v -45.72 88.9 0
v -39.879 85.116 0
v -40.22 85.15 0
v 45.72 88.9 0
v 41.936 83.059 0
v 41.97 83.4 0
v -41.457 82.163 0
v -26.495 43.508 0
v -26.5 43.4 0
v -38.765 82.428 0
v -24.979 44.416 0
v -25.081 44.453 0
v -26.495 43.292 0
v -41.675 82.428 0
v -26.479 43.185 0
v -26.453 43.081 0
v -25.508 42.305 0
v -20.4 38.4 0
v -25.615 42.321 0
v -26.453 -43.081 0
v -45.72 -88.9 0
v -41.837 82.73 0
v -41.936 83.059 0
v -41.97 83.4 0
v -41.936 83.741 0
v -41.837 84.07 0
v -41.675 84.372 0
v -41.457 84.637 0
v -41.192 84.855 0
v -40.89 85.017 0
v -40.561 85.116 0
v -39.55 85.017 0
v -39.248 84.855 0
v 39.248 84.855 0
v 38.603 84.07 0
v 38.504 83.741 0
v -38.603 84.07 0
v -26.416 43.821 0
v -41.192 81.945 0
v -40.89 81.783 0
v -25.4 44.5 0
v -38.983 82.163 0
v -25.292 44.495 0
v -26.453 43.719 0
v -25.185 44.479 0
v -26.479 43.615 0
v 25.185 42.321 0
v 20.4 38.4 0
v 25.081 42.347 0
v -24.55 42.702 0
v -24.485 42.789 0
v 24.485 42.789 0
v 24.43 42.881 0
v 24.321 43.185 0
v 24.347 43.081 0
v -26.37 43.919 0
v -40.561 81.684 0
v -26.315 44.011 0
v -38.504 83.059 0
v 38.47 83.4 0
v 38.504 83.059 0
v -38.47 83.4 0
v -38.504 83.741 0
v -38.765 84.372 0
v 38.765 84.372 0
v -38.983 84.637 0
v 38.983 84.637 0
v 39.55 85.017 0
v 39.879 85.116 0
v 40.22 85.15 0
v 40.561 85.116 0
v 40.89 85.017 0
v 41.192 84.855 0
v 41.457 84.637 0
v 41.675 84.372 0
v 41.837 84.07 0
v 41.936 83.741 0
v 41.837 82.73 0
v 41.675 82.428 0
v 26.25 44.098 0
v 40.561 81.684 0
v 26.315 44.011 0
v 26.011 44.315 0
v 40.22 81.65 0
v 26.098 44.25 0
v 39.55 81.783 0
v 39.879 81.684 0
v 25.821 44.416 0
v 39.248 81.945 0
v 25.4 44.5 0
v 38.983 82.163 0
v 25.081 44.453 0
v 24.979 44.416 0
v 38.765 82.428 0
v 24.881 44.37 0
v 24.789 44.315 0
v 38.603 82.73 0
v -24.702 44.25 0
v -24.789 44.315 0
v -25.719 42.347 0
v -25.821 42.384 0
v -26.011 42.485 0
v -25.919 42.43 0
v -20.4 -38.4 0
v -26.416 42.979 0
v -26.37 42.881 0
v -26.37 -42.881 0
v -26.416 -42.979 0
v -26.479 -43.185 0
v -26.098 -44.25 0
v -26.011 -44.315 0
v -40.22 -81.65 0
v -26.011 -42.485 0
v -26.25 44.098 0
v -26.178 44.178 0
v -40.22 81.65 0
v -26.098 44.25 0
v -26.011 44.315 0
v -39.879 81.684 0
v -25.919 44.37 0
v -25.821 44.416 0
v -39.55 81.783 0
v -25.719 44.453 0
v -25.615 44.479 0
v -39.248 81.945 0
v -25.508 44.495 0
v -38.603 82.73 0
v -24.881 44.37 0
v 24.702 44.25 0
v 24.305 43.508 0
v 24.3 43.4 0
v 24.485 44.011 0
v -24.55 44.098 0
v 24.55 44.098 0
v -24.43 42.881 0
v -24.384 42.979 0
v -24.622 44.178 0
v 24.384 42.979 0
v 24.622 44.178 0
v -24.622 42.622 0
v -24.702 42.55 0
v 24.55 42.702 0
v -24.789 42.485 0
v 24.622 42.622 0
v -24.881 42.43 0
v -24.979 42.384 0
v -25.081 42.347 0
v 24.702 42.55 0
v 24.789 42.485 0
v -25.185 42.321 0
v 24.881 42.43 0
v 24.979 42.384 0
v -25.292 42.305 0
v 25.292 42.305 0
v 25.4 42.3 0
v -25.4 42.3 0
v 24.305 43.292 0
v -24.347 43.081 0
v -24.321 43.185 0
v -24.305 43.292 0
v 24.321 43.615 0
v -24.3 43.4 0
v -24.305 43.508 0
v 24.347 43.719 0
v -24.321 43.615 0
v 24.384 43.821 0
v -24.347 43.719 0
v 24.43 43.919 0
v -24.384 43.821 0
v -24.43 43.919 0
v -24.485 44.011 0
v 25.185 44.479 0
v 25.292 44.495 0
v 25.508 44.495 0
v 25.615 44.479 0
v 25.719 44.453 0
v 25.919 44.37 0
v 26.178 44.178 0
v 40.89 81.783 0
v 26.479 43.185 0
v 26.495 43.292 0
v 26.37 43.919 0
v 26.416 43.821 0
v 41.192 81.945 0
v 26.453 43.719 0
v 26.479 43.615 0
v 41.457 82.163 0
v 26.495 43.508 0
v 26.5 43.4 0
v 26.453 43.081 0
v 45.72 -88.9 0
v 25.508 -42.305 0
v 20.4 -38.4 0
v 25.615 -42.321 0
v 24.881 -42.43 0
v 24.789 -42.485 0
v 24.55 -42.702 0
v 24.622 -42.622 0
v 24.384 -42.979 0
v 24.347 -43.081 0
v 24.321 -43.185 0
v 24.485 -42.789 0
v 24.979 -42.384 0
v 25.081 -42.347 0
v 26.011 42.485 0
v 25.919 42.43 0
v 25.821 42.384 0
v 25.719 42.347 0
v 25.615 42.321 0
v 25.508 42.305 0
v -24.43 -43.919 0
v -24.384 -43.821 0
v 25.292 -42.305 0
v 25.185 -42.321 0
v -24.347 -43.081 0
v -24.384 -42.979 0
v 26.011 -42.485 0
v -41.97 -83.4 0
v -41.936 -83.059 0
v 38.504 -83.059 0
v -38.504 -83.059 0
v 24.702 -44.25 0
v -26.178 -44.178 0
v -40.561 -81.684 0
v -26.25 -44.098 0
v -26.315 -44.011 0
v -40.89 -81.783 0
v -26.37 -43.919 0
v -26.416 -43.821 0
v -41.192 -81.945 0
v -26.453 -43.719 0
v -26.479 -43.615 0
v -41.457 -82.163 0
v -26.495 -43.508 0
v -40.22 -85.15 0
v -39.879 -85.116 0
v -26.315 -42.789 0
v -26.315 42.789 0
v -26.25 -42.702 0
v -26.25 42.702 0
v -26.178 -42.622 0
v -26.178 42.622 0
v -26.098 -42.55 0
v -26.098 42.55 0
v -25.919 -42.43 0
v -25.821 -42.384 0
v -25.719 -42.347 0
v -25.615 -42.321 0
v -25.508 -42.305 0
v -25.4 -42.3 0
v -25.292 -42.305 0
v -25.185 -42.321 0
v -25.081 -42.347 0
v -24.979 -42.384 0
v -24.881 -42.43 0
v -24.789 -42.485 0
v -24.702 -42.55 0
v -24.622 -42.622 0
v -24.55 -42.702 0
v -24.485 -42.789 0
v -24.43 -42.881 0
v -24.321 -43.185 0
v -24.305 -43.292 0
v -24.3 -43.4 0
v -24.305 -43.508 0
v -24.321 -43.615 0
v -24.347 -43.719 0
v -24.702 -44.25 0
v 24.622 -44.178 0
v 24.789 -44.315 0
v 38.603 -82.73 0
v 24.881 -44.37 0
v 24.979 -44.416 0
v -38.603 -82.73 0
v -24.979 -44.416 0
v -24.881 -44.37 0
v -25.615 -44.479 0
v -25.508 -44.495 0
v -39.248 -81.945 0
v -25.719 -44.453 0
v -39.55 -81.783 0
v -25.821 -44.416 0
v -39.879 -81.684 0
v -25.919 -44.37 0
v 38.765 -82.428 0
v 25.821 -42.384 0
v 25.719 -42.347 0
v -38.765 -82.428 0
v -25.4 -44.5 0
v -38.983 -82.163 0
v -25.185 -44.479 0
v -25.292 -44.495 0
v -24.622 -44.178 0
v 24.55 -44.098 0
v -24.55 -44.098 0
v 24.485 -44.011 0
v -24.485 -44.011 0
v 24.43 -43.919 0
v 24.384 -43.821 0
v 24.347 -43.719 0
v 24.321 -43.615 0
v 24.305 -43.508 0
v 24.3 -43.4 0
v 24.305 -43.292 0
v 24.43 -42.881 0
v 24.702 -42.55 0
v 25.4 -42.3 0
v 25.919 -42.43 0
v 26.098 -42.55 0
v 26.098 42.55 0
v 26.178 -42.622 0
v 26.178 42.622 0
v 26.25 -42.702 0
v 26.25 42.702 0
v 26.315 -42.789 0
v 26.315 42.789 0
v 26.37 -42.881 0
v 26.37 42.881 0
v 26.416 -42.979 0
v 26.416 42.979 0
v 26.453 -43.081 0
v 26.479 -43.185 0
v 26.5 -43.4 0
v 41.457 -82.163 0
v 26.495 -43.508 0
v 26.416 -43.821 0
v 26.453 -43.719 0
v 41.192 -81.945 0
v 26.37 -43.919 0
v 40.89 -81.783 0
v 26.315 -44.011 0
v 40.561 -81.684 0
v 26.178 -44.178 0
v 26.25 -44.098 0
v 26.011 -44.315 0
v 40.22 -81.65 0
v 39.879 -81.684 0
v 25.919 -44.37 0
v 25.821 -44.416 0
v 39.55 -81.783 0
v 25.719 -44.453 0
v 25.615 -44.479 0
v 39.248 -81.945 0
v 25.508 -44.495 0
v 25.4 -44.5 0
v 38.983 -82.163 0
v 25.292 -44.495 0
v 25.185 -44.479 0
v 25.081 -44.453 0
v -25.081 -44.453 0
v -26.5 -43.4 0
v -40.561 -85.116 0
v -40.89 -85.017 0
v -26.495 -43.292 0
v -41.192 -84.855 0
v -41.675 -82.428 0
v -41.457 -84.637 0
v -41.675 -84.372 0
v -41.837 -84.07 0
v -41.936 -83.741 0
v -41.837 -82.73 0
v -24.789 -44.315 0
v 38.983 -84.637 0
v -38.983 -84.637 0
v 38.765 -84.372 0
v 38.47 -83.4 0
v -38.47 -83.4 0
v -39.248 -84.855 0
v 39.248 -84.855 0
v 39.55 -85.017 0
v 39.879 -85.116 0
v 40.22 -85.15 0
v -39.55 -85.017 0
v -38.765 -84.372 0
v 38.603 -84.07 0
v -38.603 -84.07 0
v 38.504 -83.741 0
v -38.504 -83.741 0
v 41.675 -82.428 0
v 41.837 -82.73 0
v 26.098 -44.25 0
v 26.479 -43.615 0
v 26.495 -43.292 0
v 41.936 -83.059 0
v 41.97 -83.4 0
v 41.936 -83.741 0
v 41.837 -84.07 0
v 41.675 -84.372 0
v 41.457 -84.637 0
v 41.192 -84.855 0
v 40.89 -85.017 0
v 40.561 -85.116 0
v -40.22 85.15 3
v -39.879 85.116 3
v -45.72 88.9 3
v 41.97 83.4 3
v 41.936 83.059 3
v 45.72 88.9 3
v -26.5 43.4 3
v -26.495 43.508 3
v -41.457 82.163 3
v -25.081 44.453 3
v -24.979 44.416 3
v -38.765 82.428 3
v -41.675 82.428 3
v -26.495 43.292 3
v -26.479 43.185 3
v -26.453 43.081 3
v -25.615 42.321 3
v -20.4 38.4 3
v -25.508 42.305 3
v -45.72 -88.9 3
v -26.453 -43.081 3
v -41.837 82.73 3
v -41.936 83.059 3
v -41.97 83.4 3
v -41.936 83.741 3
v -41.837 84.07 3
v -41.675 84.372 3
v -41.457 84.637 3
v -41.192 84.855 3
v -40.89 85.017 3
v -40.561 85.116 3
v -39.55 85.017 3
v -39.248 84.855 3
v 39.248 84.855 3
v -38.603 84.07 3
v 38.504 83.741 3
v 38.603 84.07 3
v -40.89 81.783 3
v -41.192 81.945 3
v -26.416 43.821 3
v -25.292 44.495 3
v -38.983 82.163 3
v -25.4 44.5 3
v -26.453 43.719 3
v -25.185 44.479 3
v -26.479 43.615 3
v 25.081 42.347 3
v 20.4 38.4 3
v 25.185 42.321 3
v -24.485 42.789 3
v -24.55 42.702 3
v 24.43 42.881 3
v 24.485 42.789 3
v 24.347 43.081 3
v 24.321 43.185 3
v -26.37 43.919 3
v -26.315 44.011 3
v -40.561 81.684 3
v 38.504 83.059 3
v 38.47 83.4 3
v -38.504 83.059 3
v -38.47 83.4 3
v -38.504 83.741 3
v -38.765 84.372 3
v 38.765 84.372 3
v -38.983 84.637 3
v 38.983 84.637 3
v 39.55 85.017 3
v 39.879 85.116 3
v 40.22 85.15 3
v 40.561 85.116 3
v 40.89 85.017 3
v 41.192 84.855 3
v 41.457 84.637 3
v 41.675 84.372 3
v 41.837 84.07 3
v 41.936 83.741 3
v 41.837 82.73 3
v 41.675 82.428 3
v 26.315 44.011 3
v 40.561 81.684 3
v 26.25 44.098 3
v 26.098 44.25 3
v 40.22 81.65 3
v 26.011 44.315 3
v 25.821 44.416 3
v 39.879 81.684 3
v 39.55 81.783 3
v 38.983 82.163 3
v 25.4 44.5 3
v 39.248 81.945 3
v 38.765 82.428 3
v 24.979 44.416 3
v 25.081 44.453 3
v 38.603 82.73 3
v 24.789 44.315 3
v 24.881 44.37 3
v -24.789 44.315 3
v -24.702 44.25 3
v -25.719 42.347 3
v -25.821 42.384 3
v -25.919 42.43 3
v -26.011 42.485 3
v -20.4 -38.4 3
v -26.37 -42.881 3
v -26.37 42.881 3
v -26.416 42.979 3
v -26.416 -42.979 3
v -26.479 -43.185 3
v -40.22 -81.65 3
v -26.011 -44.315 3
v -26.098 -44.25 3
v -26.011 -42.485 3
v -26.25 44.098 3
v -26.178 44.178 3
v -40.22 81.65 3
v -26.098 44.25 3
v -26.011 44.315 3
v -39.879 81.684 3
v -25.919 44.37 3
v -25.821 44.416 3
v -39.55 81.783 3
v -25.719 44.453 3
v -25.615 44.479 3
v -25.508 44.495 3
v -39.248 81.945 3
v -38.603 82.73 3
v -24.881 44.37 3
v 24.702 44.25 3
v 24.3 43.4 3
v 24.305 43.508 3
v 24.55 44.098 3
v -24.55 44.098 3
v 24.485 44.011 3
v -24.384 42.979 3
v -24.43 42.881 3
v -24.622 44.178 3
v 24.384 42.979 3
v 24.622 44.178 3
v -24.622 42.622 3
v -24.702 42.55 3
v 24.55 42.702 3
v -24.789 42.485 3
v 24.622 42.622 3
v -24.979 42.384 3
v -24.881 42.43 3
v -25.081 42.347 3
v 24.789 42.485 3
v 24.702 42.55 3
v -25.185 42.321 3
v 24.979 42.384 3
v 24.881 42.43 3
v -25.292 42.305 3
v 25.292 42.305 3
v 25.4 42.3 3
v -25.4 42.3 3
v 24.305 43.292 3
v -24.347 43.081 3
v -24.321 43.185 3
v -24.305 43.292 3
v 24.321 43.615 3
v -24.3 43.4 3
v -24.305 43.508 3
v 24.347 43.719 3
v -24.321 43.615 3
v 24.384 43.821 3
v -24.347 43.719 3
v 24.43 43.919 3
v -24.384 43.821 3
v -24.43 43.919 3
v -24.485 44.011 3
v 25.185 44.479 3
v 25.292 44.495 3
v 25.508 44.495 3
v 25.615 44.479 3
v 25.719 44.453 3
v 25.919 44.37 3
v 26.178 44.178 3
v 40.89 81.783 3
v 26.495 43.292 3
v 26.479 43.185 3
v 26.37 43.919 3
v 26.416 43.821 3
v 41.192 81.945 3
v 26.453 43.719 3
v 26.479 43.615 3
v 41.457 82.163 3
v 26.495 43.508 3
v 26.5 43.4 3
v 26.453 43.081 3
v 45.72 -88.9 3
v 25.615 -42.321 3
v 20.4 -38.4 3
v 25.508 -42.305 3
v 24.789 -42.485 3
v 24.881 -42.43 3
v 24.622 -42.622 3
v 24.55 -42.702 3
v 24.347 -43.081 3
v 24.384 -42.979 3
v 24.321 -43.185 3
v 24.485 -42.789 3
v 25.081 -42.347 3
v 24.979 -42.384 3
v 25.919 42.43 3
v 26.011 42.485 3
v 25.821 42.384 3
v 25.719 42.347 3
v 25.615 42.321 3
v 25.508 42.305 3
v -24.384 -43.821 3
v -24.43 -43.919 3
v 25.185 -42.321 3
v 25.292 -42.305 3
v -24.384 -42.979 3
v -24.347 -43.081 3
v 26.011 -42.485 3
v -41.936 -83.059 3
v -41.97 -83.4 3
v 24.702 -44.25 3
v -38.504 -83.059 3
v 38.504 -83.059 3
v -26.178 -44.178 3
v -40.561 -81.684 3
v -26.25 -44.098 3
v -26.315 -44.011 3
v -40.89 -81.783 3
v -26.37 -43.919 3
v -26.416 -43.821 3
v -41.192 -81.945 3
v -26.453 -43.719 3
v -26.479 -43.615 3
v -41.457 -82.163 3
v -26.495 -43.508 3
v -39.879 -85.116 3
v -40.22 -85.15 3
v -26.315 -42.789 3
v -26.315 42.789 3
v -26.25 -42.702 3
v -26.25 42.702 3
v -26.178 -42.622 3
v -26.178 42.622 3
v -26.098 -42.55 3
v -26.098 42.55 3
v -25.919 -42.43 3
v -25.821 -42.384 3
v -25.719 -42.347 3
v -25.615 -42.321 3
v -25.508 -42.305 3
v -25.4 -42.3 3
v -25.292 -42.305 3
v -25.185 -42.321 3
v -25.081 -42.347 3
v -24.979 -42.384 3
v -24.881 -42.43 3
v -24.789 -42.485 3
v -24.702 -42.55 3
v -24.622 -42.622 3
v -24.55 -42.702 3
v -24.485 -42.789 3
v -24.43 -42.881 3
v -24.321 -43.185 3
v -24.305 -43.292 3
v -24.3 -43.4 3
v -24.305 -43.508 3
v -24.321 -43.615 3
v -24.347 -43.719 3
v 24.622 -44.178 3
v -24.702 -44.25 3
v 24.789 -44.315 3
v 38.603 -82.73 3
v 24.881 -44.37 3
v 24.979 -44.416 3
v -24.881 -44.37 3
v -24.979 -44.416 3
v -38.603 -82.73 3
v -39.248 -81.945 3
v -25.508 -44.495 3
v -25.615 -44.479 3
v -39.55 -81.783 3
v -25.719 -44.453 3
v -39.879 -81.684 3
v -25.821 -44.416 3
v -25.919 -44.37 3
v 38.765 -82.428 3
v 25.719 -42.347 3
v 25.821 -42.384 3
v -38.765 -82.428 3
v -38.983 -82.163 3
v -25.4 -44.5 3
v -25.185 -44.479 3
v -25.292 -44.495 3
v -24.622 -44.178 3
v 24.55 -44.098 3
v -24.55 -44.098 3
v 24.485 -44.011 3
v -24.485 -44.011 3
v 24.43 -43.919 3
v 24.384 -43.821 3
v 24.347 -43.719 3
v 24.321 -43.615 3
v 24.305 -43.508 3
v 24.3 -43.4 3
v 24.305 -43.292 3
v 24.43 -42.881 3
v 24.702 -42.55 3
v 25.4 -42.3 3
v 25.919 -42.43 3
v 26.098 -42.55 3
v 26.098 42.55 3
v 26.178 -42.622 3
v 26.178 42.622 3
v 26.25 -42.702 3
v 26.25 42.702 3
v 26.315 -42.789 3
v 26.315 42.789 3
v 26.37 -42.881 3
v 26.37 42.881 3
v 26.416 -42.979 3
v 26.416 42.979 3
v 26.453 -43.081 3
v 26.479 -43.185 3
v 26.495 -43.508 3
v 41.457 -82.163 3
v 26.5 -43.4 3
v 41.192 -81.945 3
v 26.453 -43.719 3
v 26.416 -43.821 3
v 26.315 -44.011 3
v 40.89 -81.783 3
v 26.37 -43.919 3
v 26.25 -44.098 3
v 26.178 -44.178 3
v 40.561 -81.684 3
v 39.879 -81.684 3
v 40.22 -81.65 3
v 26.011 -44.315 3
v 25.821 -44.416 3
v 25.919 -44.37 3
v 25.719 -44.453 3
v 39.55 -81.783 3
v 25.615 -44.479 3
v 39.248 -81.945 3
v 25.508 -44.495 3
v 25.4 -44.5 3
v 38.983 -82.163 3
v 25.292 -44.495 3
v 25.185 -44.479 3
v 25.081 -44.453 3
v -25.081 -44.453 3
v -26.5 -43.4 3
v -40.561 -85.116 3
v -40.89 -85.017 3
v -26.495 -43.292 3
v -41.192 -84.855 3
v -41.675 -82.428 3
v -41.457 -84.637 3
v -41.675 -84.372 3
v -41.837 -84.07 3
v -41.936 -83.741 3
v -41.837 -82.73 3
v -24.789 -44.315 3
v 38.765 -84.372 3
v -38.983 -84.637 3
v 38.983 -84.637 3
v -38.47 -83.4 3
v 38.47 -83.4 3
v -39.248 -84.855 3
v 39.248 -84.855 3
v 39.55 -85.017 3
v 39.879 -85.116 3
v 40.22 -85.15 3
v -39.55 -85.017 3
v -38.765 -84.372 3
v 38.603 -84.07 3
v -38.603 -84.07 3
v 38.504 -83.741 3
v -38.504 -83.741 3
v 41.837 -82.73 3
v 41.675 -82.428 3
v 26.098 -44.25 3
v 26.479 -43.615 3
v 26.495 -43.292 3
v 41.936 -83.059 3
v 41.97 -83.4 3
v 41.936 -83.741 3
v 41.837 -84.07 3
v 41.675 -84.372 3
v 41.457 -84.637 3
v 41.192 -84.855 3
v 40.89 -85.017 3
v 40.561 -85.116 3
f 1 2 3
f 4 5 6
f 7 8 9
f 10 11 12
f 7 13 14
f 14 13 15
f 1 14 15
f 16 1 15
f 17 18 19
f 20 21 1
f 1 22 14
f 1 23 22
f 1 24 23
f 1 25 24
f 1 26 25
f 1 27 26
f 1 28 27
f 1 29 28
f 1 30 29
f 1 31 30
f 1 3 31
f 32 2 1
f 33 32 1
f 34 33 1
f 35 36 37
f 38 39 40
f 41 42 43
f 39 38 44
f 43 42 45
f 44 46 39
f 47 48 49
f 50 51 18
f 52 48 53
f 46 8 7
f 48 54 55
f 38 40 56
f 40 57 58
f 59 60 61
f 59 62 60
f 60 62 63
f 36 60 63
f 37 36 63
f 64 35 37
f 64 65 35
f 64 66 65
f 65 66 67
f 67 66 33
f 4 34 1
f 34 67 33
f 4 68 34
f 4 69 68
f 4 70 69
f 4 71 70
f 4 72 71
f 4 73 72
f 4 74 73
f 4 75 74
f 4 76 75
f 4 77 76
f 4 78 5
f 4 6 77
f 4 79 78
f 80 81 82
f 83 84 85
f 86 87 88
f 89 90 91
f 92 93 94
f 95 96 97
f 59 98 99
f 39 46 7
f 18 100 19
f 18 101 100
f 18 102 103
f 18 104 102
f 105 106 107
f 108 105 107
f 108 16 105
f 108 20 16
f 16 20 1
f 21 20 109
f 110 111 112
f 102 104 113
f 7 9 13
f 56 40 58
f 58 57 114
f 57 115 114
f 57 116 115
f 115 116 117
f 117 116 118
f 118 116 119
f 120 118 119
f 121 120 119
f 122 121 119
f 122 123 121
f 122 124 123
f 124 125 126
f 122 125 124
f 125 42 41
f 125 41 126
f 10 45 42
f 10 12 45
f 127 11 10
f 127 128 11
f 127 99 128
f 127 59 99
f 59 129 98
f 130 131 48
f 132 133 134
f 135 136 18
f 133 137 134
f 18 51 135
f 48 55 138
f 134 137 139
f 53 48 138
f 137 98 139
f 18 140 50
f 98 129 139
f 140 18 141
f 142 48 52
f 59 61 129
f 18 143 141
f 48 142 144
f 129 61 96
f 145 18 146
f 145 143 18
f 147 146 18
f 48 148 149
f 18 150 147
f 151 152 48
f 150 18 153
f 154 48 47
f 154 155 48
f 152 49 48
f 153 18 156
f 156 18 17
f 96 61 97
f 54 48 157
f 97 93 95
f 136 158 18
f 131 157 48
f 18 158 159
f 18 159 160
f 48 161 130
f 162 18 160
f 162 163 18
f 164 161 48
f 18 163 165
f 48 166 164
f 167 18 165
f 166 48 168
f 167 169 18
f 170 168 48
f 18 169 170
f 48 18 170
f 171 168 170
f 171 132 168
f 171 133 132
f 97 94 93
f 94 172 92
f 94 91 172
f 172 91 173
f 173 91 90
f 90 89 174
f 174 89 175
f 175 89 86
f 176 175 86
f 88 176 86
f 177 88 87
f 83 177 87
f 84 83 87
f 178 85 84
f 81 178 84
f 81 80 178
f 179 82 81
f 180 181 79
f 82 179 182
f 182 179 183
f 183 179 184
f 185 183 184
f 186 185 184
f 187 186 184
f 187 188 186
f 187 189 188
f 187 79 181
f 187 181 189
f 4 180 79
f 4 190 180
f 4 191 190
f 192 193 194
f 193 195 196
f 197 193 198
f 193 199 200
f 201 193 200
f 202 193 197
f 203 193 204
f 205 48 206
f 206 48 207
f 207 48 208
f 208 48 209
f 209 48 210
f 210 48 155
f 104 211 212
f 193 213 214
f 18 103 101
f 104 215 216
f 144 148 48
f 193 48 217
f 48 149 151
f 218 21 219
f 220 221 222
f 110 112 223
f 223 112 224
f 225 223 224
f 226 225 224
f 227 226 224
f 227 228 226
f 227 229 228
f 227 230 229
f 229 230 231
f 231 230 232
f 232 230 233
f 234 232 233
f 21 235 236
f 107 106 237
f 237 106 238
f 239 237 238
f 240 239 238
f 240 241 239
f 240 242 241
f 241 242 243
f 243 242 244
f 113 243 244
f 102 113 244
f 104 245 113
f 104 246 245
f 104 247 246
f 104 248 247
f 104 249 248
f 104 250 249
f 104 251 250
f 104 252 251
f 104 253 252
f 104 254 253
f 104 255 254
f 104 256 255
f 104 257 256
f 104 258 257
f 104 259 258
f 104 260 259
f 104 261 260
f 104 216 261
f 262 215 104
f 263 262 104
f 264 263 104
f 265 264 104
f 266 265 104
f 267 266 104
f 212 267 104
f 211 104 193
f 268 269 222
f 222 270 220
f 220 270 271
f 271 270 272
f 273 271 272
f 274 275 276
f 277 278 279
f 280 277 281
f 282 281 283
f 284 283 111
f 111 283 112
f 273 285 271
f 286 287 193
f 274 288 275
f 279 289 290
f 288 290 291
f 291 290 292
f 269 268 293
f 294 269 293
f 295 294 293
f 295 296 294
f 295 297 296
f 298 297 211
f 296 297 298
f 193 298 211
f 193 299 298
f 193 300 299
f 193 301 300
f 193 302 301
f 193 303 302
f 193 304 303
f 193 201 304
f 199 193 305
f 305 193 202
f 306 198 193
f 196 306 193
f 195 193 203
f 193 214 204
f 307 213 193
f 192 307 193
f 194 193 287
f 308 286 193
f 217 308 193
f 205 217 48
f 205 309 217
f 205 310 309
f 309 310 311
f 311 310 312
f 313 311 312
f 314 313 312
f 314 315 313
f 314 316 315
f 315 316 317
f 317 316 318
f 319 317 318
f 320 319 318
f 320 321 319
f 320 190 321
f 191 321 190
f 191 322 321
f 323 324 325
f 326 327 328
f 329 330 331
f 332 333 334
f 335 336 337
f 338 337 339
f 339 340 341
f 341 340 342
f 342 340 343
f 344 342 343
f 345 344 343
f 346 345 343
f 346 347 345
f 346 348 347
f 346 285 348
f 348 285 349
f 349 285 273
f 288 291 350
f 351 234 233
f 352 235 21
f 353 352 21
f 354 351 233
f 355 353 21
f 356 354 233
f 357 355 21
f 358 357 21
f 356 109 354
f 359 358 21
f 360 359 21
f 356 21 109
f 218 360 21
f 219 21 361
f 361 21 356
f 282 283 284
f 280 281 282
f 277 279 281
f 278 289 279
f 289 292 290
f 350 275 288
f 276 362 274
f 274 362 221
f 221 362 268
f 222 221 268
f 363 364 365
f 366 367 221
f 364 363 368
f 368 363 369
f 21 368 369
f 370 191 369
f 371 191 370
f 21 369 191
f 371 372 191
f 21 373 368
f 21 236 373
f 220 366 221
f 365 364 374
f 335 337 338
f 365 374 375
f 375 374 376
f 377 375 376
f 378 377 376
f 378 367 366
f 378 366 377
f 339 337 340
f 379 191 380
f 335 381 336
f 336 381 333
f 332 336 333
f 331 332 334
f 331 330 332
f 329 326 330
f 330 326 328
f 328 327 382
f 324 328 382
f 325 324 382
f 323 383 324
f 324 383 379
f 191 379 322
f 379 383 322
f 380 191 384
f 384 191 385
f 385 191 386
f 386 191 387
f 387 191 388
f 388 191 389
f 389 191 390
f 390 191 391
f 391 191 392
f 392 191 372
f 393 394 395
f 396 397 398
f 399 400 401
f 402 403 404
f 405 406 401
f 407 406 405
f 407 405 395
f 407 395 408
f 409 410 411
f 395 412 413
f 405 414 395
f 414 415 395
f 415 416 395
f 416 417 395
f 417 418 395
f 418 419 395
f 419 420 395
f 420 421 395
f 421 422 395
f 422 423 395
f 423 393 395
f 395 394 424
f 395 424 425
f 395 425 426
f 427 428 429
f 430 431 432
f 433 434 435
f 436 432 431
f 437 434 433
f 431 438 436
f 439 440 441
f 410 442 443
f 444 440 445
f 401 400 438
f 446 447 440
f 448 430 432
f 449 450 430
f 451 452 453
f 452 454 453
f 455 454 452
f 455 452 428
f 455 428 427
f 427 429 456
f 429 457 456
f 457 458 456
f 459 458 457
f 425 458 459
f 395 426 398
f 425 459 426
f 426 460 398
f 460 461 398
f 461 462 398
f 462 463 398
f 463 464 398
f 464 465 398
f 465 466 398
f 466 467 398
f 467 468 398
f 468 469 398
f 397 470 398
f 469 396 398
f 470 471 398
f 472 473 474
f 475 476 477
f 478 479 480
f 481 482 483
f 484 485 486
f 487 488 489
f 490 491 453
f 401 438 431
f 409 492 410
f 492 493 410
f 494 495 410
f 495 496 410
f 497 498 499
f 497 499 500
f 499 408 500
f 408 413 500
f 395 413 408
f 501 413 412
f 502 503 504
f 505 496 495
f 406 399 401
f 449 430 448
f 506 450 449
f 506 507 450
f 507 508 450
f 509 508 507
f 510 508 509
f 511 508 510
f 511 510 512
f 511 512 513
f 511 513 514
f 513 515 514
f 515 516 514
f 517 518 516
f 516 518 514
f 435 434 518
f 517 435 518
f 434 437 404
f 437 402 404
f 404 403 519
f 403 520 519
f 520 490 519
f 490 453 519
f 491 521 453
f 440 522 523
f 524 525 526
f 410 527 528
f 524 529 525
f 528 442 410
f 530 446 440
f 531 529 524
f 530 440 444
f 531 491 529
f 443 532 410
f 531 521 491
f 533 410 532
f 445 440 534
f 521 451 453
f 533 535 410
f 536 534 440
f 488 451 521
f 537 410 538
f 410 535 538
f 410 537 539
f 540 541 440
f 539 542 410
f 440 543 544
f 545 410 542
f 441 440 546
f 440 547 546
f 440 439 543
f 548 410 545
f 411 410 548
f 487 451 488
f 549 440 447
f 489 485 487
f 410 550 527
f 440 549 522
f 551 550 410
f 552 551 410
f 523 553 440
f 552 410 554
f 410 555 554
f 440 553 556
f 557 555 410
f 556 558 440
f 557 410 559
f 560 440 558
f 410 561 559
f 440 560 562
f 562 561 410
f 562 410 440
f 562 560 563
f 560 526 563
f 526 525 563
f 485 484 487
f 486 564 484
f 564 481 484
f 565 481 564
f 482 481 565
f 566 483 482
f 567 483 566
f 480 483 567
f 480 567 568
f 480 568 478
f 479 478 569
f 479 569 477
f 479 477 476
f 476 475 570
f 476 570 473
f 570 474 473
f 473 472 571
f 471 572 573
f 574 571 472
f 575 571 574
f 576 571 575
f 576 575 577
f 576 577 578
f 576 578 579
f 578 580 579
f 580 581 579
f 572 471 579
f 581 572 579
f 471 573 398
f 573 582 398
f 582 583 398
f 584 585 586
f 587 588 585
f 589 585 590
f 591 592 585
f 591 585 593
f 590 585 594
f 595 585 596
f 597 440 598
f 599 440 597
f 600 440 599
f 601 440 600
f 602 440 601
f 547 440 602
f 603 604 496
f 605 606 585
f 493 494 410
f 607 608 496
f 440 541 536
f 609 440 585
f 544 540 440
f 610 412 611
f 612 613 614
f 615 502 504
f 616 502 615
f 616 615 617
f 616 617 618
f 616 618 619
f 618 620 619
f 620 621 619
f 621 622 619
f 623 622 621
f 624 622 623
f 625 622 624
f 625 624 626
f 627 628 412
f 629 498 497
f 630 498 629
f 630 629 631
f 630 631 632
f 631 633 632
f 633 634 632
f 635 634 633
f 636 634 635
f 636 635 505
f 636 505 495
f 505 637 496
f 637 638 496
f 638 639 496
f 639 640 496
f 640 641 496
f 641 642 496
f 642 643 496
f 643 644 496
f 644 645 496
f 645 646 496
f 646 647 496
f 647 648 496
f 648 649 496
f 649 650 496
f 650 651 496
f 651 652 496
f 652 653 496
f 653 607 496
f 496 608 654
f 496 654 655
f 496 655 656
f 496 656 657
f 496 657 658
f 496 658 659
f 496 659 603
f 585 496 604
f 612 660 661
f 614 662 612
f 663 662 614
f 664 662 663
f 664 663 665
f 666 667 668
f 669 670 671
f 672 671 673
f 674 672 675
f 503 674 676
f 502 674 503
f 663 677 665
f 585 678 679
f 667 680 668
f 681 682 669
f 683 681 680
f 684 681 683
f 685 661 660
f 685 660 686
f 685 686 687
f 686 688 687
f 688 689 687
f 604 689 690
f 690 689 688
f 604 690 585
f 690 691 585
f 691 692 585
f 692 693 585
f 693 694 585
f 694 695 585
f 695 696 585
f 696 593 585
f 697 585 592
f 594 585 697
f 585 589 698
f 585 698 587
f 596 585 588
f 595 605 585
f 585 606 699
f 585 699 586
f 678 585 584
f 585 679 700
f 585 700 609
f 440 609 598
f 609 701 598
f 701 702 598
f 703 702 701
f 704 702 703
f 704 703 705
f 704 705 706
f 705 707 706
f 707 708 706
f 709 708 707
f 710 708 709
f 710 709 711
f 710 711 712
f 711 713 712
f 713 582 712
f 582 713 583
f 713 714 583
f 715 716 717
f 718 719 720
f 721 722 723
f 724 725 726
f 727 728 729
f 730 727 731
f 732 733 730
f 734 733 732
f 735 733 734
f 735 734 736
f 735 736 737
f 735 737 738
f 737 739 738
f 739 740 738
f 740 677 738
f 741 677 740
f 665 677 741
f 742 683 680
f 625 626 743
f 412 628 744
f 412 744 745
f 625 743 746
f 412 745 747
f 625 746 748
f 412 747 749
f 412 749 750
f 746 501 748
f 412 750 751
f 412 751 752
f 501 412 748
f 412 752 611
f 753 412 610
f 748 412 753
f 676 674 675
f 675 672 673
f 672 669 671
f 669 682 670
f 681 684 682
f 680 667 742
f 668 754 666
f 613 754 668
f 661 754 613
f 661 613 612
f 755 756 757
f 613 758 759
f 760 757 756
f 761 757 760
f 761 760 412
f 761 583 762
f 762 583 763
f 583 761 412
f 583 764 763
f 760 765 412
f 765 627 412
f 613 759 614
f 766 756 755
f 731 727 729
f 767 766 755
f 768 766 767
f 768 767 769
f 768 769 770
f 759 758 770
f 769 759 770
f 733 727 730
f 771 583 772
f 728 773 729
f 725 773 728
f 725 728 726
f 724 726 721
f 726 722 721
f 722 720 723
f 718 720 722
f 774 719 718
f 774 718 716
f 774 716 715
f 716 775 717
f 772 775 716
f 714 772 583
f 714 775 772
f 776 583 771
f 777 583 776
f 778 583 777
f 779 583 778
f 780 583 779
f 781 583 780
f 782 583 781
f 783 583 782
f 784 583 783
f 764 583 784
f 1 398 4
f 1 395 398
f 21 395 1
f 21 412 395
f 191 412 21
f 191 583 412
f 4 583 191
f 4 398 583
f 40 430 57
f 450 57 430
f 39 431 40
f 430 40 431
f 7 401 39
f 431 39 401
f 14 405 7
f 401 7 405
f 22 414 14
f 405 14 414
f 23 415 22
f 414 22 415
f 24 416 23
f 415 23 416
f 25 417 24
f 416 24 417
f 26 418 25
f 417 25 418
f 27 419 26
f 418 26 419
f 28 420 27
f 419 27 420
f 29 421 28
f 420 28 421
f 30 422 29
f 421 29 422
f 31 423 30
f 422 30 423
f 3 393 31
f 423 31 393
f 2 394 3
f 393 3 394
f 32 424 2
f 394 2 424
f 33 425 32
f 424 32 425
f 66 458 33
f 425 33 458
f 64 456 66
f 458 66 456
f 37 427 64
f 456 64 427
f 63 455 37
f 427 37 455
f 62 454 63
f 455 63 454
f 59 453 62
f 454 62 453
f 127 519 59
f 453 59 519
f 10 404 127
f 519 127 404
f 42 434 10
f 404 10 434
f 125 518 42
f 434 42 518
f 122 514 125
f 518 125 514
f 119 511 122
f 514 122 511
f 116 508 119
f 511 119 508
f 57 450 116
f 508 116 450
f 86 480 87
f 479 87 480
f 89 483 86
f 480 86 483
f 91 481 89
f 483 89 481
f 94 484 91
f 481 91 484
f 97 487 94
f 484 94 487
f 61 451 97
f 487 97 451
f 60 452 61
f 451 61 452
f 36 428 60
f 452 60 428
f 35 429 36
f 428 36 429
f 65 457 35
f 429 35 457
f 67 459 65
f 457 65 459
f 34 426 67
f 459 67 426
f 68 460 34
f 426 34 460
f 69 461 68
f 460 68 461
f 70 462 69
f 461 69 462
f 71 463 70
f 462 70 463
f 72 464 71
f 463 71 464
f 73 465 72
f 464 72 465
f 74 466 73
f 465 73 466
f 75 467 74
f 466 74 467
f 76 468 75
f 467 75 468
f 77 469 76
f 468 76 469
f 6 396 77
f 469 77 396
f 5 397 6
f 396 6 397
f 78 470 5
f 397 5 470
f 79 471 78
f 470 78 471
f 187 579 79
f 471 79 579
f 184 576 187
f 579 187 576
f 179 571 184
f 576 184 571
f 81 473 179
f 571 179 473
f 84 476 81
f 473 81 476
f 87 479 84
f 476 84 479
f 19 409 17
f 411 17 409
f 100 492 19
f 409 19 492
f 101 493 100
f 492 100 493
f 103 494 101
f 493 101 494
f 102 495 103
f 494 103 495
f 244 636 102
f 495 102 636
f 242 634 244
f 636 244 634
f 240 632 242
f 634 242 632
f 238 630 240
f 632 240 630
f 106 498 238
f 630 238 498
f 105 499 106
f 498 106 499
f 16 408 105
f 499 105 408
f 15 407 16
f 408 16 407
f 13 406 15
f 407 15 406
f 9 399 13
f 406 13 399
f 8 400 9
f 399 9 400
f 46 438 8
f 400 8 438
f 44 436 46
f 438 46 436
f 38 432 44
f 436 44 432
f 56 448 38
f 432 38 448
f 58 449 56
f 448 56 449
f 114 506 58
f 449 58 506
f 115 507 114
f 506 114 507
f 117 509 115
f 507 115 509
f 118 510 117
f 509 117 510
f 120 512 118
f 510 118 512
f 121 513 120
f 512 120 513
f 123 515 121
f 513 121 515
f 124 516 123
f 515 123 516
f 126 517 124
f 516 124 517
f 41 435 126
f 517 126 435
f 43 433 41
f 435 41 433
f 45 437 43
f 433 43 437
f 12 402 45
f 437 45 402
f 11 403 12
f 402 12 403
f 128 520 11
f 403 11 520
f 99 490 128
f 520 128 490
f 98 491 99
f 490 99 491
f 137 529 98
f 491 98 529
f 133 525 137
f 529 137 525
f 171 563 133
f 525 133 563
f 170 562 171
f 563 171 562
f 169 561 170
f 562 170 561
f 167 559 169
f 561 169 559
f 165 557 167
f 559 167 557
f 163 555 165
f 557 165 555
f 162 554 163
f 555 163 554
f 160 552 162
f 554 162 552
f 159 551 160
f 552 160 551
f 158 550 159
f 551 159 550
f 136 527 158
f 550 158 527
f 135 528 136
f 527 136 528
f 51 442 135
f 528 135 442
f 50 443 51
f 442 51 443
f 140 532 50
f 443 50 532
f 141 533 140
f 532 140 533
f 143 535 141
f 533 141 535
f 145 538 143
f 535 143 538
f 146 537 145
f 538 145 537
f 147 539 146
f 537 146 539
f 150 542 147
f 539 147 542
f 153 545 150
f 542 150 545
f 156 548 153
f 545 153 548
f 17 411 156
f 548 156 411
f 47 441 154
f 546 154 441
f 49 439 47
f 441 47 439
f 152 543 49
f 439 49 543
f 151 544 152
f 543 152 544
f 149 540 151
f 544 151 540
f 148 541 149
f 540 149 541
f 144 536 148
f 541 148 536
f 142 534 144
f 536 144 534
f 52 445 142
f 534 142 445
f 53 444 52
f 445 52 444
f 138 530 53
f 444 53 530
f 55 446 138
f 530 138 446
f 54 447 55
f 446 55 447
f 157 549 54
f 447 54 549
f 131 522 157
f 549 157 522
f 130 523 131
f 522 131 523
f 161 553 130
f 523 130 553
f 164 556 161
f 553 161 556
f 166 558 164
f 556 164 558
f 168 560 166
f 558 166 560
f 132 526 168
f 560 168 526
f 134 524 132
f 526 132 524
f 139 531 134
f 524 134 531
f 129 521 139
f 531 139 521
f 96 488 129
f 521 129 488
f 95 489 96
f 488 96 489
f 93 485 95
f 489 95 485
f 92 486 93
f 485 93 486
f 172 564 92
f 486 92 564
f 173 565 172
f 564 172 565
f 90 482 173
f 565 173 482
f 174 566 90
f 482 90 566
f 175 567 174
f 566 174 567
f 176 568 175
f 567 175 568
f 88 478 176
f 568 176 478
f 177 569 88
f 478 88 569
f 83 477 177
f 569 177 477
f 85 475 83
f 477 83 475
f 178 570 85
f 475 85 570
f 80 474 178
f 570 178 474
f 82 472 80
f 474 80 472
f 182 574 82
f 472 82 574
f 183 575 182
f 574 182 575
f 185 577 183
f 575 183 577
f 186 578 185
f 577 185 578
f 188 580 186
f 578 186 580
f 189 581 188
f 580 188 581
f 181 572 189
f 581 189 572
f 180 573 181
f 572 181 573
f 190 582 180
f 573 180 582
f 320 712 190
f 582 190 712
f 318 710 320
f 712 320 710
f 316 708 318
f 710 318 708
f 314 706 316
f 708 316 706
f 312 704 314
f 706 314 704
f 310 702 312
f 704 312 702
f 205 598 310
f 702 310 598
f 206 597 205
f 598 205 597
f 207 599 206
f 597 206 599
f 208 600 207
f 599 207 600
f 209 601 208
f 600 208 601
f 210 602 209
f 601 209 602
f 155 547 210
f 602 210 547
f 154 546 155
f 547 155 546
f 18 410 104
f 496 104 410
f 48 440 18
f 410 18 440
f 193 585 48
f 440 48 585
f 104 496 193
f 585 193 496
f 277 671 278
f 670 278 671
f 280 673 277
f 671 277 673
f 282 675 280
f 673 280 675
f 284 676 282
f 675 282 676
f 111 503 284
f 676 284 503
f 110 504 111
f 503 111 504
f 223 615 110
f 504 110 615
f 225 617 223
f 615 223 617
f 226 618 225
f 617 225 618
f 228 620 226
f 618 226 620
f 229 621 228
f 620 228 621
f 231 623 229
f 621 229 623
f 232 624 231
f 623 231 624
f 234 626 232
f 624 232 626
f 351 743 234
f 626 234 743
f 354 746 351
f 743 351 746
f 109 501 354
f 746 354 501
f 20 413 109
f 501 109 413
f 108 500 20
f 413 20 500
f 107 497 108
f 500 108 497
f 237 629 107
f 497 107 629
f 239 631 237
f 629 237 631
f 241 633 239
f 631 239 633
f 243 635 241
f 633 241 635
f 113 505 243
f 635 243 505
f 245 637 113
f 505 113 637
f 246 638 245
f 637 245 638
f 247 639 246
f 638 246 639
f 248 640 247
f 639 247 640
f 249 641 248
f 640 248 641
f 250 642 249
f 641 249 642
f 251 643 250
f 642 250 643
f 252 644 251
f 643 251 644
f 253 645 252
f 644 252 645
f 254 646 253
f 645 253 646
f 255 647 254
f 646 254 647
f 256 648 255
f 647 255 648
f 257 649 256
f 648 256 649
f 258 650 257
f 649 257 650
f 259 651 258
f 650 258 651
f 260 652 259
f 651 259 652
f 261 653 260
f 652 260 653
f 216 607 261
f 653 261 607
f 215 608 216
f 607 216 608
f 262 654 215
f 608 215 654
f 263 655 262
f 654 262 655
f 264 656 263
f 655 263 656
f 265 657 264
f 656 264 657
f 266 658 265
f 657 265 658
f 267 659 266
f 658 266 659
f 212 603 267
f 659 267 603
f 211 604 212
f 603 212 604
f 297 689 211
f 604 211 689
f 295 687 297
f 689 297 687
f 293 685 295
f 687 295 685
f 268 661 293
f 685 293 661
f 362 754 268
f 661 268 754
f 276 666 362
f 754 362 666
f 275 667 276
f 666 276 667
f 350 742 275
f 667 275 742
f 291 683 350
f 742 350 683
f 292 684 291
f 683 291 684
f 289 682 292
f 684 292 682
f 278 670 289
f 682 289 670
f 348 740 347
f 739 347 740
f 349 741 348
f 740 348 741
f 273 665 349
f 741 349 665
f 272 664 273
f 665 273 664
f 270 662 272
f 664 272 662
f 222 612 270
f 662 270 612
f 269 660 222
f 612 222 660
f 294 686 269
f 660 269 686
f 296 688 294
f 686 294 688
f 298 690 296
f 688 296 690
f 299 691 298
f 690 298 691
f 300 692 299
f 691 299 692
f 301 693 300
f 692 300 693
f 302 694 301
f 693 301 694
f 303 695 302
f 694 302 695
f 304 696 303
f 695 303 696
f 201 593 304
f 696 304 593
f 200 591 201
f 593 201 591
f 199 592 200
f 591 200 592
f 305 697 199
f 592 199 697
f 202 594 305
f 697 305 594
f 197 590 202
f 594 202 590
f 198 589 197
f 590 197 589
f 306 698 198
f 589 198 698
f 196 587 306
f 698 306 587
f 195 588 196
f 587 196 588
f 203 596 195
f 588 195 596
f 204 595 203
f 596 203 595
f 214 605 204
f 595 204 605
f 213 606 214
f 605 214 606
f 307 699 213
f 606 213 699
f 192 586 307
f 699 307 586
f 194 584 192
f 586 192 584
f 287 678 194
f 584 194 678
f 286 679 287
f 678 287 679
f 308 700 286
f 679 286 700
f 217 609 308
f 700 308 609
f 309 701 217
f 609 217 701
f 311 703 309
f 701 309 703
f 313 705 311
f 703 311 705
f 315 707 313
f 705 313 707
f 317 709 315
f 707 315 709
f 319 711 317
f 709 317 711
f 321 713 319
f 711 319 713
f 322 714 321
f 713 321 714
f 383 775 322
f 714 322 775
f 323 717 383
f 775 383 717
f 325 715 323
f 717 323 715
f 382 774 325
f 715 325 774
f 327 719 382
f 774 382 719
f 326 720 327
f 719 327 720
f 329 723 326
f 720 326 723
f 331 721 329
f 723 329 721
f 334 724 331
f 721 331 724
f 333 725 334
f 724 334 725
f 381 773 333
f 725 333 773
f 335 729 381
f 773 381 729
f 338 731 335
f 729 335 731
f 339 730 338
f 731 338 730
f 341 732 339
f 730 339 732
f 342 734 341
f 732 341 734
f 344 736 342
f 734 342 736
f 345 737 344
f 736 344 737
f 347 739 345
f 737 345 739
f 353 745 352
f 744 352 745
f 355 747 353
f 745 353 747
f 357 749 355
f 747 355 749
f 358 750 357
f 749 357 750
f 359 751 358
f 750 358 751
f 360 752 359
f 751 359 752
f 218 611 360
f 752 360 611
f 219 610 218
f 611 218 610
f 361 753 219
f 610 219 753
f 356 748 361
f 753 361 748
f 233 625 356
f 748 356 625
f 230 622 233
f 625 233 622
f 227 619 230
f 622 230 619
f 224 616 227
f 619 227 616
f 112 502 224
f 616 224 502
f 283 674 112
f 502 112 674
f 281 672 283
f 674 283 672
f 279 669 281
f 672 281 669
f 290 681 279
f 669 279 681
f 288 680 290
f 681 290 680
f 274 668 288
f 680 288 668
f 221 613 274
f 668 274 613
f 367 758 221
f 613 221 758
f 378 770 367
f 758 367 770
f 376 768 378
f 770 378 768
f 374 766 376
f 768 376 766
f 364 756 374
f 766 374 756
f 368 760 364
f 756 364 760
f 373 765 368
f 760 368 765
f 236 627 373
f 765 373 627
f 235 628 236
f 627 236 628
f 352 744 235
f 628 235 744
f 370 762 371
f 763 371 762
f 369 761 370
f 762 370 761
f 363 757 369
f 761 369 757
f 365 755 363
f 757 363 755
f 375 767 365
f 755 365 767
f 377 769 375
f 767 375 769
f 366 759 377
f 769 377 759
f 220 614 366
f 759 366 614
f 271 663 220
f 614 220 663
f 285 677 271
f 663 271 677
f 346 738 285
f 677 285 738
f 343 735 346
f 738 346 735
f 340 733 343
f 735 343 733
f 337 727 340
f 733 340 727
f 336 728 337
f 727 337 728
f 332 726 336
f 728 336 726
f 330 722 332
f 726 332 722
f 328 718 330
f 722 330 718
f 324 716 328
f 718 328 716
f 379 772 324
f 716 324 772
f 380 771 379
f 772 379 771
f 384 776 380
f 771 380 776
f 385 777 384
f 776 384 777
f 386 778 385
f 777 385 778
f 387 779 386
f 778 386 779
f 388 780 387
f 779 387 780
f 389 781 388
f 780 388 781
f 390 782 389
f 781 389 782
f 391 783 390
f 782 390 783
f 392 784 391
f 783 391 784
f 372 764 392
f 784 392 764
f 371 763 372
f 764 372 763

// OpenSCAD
// file: ../../makerpanel/common.scad
// =============================================================================
// MakerPanel System OpenSCAD Models
// Copyright (c) 2025 Ranch Hand Robotics, LLC. All rights reserved.
// Licensed under MIT License: https://opensource.org/licenses/MIT
// Modular maker panel system with T-slot rail mounting support
// All dimensions in millimeters
// =============================================================================

// ============================================
// Constants
// ============================================

// Panel Units
INCH = 25.4;         // Millimeters per inch
HP = 5.08;           // Horizontal Pitch = 5.08mm (0.200")
U = 44.45;           // Vertical Unit outer span = 44.45mm (1.75")

// T-Slot Specifications
// Standard T-slot twist nuts (M5/M6 compatible, drop-in style)
T_SLOT_HEIGHT = 6.9;           // T-slot nut width (M5/M6)
T_SLOT_WIDTH = 5.75 * HP;      // 5.75 HP (29.06mm) avoids even 4-HP grid alignment
T_SLOT_CORNER_RADIUS = 1.0;

// Rack Specifications
RACK_SUPPORT_WIDTH = 3; 
RACK_HOLE_DIAMETER = 3.5;   // M3 mounting holes
RACK_RAIL_HEIGHT = 11; 
RACK_RAIL_THICKNESS = 3;    // Rail material thickness
RACK_MOUNT_SLOT_LEN = 8;
CENTER_CUTOUT_SIDE_MARGIN = 2.5;
CENTER_CUTOUT_SLOT_MARGIN = 2;

// Rack Widths
RACK_19_WIDTH = 19 * INCH;  // 19 inches = 482.6 mm
RACK_10_WIDTH = 10 * INCH;  // 10 inches = 254 mm

// Panel Specifications
PANEL_THICKNESS = 3;        // Aluminum panel thickness
PANEL_DEPTH_MAX = 60;       // Maximum panel depth from front
MOUNT_HOLE_DIAMETER = 3.5;  // M3 mounting hole (for T-nuts)


// ============================================
// Utility Functions
// ============================================

// Convert HP to millimeters
function hp_to_mm(hp) = hp * HP;

// Convert U to millimeters
function u_to_mm(u) = u * U;

// Convert U to clear opening between adjacent T-slots.
// For 1U this is: U - (2 * T_SLOT_HEIGHT).
function u_clear_to_mm(u) = u * U - 2 * T_SLOT_HEIGHT;
// file: ../../makerpanel/panel.scad
// Makerpanel System OpenSCAD Models
// Copyright (c) 2025 Ranch Hand Robotics, LLC. All rights reserved.
// Licensed under MIT License: https://opensource.org/licenses/MIT
// Modular maker panel system with rack mounting support
// All dimensions in millimeters
include <common.scad>

// ============================================
// Module: Panel with T-Slot Mounting Holes
// ============================================

module makerpanel_2d(width_hp, height_u, mount_hole_diameter=MOUNT_HOLE_DIAMETER) {
    /*
        Creates a 2D maker panel profile with T-slot mounting holes (M5/M6 compatible)
    Parameters:
      - width_hp: width in HP units
      - height_u: height in U units
            - mount_hole_diameter: mounting hole diameter in mm (default from common.scad)
    */
    
    width_mm = hp_to_mm(width_hp);
    height_mm = u_to_mm(height_u);
    half_w = width_mm / 2;
    half_h = height_mm / 2;
    
    // Calculate mounting hole positions
    // For panels <1U: one centered hole per side (left/right)
    // For panels >=1U: four corner holes
    hole_inset_x = RACK_RAIL_HEIGHT / 2;
    hole_inset_y = RACK_RAIL_HEIGHT / 2;
    
    difference() {
        // Base panel
        square([width_mm, height_mm], center=true);
        
        if (height_u < 1) {
            // Sub-1U: one centered mounting hole on each side
            translate([-(half_w - hole_inset_x), 0])
                circle(r=mount_hole_diameter/2, $fn=32);

            translate([(half_w - hole_inset_x), 0])
                circle(r=mount_hole_diameter/2, $fn=32);
        } else {
            // 1U and larger: 4 corner mounting holes (M3 for T-nuts)
            // Bottom-left
            translate([-(half_w - hole_inset_x), -(half_h - hole_inset_y)])
                circle(r=mount_hole_diameter/2, $fn=32);

            // Bottom-right
            translate([(half_w - hole_inset_x), -(half_h - hole_inset_y)])
                circle(r=mount_hole_diameter/2, $fn=32);

            // Top-left
            translate([-(half_w - hole_inset_x), (half_h - hole_inset_y)])
                circle(r=mount_hole_diameter/2, $fn=32);

            // Top-right
            translate([(half_w - hole_inset_x), (half_h - hole_inset_y)])
                circle(r=mount_hole_diameter/2, $fn=32);
        }
    }
}

module makerpanel(width_hp, height_u, thickness=PANEL_THICKNESS, mount_hole_diameter=MOUNT_HOLE_DIAMETER) {
    /*
    Creates a maker panel with T-slot mounting holes (M5/M6 compatible)
    Parameters:
      - width_hp: width in HP units
      - height_u: height in U units
      - thickness: panel thickness in mm (default 3mm aluminum)
            - mount_hole_diameter: mounting hole diameter in mm (default from common.scad)
    */
    linear_extrude(height=thickness)
        makerpanel_2d(width_hp, height_u, mount_hole_diameter=mount_hole_diameter);
}
// main file
// MakerPanel for an underside-mounted meishi trackball module.
// Reference: https://github.com/aki27kbd/trackball_module
// Dimensions extracted from meishi_trackball_module_bottom.pdf at 1:1.
// See README.md for the measurement method and mounting assumptions.

include <../../makerpanel/panel.scad>

/* [Customization] */
part = "panel"; // [panel, panel_2d, assembly, footprint]
horizontalPitch = 18; // [12:1:40]
verticalUnits = 4; // [2.5:0.5:6]
panelThickness = 3; // [1.6:0.1:3]
// Added to the PDF hole diameter; zero preserves the original pattern.
holeClearance = 0; // [0:0.05:1]
// Opening edges are this far inward from the mounting-hole center lines.
openingInset = 5; // [3.6:0.1:20]

/* [Hidden] */
// Native PDF units are points: 1 pt = 25.4 / 72 mm.
// Origin: outline center. X right, Y up (PDF page Y is inverted).
trackball_width = 55;
trackball_height = 91;
trackball_corner_radius = 2.1;
trackball_hole_diameter = 2.2;
trackball_hole_pitch = [50.8, 86.8];
trackball_hole_centers = [
	[-trackball_hole_pitch.x / 2, -trackball_hole_pitch.y / 2],
	[ trackball_hole_pitch.x / 2, -trackball_hole_pitch.y / 2],
	[-trackball_hole_pitch.x / 2,  trackball_hole_pitch.y / 2],
	[ trackball_hole_pitch.x / 2,  trackball_hole_pitch.y / 2]
];
panel_width = hp_to_mm(horizontalPitch);
// Preserve the library's full-U height, not the spec's 128.5 mm 3U face.
panel_height = u_to_mm(verticalUnits);
mount_diameter = trackball_hole_diameter + holeClearance;
opening_size = trackball_hole_pitch - [2 * openingInset, 2 * openingInset];
edge_clearance = 2;
rail_hole_x = (panel_width - RACK_RAIL_HEIGHT) / 2;
rail_hole_y = (panel_height - RACK_RAIL_HEIGHT) / 2;
footprint_preview_thickness = 0.5;
$fn = 64;

module validate_trackball_panel() {
	assert(horizontalPitch > 0 && horizontalPitch == floor(horizontalPitch),
		"Panel width must be a positive whole number of HP.");
	assert(verticalUnits > 0 && panelThickness > 0 && panelThickness <= 3,
		"Use a positive panel height and a thickness up to 3 mm.");
	assert(holeClearance >= 0, "Hole clearance must not be negative.");
	assert(opening_size.x > 0 && opening_size.y > 0,
		"Opening inset must leave a positive rectangular opening.");
	assert(openingInset >= mount_diameter / 2 + edge_clearance,
		"Opening must stay at least 2 mm inside the mounting-hole edges.");
	assert(panel_width >= trackball_width + 2 * edge_clearance &&
		   panel_height >= trackball_height + 2 * edge_clearance,
		"Panel must leave 2 mm around the trackball footprint.");
	assert(panel_width >= trackball_hole_pitch.x + mount_diameter +
		   2 * edge_clearance &&
		   panel_height >= trackball_hole_pitch.y + mount_diameter +
		   2 * edge_clearance,
		"Trackball mounting holes need 2 mm of material to the panel edge.");
	// Keep rail holes and an extra 2 mm clear of the module footprint.
	assert(rail_hole_x >= trackball_width / 2 +
		   MOUNT_HOLE_DIAMETER / 2 + edge_clearance ||
		   rail_hole_y >= trackball_height / 2 +
		   MOUNT_HOLE_DIAMETER / 2 + edge_clearance,
		"Increase HP or U: the module would obstruct the rail fasteners.");
	for (hole = trackball_hole_centers)
		for (sx = [-1, 1], sy = [-1, 1])
			assert(norm(hole - [sx * rail_hole_x, sy * rail_hole_y]) >=
				   (mount_diameter + MOUNT_HOLE_DIAMETER) / 2 +
				   edge_clearance,
				"Trackball and rail holes need 2 mm of material between.");
	children();
}

module trackball_mount_holes_2d(diameter = mount_diameter) {
	for (hole = trackball_hole_centers)
		translate(hole)
			circle(d = diameter);
}

module trackball_outline_2d() {
	// Idealized rounded rectangle from the PDF's straight-line endpoints.
	offset(r = trackball_corner_radius)
		square([
			trackball_width - 2 * trackball_corner_radius,
			trackball_height - 2 * trackball_corner_radius
		], center = true);
}

module trackball_footprint_2d() {
	difference() {
		trackball_outline_2d();
		trackball_mount_holes_2d(diameter = trackball_hole_diameter);
	}
}

module trackball_panel_2d() {
	validate_trackball_panel()
		difference() {
			makerpanel_2d(horizontalPitch, verticalUnits);
			trackball_mount_holes_2d();
			square(opening_size, center = true);
		}
}

module trackball_panel() {
	linear_extrude(height = panelThickness)
		trackball_panel_2d();
}

module trackball_assembly() {
	trackball_panel();
	// A footprint only, NOT a model of the module's unknown height.
	// Background geometry is excluded from manufacturing exports.
	%translate([0, 0, -footprint_preview_thickness])
		linear_extrude(height = footprint_preview_thickness)
			trackball_footprint_2d();
}

if (part == "panel") {
	trackball_panel();
} else if (part == "panel_2d") {
	trackball_panel_2d();
} else if (part == "assembly") {
	trackball_assembly();
} else if (part == "footprint") {
	trackball_footprint_2d();
} else {
	assert(false, str("Unknown part: ", part));
}
